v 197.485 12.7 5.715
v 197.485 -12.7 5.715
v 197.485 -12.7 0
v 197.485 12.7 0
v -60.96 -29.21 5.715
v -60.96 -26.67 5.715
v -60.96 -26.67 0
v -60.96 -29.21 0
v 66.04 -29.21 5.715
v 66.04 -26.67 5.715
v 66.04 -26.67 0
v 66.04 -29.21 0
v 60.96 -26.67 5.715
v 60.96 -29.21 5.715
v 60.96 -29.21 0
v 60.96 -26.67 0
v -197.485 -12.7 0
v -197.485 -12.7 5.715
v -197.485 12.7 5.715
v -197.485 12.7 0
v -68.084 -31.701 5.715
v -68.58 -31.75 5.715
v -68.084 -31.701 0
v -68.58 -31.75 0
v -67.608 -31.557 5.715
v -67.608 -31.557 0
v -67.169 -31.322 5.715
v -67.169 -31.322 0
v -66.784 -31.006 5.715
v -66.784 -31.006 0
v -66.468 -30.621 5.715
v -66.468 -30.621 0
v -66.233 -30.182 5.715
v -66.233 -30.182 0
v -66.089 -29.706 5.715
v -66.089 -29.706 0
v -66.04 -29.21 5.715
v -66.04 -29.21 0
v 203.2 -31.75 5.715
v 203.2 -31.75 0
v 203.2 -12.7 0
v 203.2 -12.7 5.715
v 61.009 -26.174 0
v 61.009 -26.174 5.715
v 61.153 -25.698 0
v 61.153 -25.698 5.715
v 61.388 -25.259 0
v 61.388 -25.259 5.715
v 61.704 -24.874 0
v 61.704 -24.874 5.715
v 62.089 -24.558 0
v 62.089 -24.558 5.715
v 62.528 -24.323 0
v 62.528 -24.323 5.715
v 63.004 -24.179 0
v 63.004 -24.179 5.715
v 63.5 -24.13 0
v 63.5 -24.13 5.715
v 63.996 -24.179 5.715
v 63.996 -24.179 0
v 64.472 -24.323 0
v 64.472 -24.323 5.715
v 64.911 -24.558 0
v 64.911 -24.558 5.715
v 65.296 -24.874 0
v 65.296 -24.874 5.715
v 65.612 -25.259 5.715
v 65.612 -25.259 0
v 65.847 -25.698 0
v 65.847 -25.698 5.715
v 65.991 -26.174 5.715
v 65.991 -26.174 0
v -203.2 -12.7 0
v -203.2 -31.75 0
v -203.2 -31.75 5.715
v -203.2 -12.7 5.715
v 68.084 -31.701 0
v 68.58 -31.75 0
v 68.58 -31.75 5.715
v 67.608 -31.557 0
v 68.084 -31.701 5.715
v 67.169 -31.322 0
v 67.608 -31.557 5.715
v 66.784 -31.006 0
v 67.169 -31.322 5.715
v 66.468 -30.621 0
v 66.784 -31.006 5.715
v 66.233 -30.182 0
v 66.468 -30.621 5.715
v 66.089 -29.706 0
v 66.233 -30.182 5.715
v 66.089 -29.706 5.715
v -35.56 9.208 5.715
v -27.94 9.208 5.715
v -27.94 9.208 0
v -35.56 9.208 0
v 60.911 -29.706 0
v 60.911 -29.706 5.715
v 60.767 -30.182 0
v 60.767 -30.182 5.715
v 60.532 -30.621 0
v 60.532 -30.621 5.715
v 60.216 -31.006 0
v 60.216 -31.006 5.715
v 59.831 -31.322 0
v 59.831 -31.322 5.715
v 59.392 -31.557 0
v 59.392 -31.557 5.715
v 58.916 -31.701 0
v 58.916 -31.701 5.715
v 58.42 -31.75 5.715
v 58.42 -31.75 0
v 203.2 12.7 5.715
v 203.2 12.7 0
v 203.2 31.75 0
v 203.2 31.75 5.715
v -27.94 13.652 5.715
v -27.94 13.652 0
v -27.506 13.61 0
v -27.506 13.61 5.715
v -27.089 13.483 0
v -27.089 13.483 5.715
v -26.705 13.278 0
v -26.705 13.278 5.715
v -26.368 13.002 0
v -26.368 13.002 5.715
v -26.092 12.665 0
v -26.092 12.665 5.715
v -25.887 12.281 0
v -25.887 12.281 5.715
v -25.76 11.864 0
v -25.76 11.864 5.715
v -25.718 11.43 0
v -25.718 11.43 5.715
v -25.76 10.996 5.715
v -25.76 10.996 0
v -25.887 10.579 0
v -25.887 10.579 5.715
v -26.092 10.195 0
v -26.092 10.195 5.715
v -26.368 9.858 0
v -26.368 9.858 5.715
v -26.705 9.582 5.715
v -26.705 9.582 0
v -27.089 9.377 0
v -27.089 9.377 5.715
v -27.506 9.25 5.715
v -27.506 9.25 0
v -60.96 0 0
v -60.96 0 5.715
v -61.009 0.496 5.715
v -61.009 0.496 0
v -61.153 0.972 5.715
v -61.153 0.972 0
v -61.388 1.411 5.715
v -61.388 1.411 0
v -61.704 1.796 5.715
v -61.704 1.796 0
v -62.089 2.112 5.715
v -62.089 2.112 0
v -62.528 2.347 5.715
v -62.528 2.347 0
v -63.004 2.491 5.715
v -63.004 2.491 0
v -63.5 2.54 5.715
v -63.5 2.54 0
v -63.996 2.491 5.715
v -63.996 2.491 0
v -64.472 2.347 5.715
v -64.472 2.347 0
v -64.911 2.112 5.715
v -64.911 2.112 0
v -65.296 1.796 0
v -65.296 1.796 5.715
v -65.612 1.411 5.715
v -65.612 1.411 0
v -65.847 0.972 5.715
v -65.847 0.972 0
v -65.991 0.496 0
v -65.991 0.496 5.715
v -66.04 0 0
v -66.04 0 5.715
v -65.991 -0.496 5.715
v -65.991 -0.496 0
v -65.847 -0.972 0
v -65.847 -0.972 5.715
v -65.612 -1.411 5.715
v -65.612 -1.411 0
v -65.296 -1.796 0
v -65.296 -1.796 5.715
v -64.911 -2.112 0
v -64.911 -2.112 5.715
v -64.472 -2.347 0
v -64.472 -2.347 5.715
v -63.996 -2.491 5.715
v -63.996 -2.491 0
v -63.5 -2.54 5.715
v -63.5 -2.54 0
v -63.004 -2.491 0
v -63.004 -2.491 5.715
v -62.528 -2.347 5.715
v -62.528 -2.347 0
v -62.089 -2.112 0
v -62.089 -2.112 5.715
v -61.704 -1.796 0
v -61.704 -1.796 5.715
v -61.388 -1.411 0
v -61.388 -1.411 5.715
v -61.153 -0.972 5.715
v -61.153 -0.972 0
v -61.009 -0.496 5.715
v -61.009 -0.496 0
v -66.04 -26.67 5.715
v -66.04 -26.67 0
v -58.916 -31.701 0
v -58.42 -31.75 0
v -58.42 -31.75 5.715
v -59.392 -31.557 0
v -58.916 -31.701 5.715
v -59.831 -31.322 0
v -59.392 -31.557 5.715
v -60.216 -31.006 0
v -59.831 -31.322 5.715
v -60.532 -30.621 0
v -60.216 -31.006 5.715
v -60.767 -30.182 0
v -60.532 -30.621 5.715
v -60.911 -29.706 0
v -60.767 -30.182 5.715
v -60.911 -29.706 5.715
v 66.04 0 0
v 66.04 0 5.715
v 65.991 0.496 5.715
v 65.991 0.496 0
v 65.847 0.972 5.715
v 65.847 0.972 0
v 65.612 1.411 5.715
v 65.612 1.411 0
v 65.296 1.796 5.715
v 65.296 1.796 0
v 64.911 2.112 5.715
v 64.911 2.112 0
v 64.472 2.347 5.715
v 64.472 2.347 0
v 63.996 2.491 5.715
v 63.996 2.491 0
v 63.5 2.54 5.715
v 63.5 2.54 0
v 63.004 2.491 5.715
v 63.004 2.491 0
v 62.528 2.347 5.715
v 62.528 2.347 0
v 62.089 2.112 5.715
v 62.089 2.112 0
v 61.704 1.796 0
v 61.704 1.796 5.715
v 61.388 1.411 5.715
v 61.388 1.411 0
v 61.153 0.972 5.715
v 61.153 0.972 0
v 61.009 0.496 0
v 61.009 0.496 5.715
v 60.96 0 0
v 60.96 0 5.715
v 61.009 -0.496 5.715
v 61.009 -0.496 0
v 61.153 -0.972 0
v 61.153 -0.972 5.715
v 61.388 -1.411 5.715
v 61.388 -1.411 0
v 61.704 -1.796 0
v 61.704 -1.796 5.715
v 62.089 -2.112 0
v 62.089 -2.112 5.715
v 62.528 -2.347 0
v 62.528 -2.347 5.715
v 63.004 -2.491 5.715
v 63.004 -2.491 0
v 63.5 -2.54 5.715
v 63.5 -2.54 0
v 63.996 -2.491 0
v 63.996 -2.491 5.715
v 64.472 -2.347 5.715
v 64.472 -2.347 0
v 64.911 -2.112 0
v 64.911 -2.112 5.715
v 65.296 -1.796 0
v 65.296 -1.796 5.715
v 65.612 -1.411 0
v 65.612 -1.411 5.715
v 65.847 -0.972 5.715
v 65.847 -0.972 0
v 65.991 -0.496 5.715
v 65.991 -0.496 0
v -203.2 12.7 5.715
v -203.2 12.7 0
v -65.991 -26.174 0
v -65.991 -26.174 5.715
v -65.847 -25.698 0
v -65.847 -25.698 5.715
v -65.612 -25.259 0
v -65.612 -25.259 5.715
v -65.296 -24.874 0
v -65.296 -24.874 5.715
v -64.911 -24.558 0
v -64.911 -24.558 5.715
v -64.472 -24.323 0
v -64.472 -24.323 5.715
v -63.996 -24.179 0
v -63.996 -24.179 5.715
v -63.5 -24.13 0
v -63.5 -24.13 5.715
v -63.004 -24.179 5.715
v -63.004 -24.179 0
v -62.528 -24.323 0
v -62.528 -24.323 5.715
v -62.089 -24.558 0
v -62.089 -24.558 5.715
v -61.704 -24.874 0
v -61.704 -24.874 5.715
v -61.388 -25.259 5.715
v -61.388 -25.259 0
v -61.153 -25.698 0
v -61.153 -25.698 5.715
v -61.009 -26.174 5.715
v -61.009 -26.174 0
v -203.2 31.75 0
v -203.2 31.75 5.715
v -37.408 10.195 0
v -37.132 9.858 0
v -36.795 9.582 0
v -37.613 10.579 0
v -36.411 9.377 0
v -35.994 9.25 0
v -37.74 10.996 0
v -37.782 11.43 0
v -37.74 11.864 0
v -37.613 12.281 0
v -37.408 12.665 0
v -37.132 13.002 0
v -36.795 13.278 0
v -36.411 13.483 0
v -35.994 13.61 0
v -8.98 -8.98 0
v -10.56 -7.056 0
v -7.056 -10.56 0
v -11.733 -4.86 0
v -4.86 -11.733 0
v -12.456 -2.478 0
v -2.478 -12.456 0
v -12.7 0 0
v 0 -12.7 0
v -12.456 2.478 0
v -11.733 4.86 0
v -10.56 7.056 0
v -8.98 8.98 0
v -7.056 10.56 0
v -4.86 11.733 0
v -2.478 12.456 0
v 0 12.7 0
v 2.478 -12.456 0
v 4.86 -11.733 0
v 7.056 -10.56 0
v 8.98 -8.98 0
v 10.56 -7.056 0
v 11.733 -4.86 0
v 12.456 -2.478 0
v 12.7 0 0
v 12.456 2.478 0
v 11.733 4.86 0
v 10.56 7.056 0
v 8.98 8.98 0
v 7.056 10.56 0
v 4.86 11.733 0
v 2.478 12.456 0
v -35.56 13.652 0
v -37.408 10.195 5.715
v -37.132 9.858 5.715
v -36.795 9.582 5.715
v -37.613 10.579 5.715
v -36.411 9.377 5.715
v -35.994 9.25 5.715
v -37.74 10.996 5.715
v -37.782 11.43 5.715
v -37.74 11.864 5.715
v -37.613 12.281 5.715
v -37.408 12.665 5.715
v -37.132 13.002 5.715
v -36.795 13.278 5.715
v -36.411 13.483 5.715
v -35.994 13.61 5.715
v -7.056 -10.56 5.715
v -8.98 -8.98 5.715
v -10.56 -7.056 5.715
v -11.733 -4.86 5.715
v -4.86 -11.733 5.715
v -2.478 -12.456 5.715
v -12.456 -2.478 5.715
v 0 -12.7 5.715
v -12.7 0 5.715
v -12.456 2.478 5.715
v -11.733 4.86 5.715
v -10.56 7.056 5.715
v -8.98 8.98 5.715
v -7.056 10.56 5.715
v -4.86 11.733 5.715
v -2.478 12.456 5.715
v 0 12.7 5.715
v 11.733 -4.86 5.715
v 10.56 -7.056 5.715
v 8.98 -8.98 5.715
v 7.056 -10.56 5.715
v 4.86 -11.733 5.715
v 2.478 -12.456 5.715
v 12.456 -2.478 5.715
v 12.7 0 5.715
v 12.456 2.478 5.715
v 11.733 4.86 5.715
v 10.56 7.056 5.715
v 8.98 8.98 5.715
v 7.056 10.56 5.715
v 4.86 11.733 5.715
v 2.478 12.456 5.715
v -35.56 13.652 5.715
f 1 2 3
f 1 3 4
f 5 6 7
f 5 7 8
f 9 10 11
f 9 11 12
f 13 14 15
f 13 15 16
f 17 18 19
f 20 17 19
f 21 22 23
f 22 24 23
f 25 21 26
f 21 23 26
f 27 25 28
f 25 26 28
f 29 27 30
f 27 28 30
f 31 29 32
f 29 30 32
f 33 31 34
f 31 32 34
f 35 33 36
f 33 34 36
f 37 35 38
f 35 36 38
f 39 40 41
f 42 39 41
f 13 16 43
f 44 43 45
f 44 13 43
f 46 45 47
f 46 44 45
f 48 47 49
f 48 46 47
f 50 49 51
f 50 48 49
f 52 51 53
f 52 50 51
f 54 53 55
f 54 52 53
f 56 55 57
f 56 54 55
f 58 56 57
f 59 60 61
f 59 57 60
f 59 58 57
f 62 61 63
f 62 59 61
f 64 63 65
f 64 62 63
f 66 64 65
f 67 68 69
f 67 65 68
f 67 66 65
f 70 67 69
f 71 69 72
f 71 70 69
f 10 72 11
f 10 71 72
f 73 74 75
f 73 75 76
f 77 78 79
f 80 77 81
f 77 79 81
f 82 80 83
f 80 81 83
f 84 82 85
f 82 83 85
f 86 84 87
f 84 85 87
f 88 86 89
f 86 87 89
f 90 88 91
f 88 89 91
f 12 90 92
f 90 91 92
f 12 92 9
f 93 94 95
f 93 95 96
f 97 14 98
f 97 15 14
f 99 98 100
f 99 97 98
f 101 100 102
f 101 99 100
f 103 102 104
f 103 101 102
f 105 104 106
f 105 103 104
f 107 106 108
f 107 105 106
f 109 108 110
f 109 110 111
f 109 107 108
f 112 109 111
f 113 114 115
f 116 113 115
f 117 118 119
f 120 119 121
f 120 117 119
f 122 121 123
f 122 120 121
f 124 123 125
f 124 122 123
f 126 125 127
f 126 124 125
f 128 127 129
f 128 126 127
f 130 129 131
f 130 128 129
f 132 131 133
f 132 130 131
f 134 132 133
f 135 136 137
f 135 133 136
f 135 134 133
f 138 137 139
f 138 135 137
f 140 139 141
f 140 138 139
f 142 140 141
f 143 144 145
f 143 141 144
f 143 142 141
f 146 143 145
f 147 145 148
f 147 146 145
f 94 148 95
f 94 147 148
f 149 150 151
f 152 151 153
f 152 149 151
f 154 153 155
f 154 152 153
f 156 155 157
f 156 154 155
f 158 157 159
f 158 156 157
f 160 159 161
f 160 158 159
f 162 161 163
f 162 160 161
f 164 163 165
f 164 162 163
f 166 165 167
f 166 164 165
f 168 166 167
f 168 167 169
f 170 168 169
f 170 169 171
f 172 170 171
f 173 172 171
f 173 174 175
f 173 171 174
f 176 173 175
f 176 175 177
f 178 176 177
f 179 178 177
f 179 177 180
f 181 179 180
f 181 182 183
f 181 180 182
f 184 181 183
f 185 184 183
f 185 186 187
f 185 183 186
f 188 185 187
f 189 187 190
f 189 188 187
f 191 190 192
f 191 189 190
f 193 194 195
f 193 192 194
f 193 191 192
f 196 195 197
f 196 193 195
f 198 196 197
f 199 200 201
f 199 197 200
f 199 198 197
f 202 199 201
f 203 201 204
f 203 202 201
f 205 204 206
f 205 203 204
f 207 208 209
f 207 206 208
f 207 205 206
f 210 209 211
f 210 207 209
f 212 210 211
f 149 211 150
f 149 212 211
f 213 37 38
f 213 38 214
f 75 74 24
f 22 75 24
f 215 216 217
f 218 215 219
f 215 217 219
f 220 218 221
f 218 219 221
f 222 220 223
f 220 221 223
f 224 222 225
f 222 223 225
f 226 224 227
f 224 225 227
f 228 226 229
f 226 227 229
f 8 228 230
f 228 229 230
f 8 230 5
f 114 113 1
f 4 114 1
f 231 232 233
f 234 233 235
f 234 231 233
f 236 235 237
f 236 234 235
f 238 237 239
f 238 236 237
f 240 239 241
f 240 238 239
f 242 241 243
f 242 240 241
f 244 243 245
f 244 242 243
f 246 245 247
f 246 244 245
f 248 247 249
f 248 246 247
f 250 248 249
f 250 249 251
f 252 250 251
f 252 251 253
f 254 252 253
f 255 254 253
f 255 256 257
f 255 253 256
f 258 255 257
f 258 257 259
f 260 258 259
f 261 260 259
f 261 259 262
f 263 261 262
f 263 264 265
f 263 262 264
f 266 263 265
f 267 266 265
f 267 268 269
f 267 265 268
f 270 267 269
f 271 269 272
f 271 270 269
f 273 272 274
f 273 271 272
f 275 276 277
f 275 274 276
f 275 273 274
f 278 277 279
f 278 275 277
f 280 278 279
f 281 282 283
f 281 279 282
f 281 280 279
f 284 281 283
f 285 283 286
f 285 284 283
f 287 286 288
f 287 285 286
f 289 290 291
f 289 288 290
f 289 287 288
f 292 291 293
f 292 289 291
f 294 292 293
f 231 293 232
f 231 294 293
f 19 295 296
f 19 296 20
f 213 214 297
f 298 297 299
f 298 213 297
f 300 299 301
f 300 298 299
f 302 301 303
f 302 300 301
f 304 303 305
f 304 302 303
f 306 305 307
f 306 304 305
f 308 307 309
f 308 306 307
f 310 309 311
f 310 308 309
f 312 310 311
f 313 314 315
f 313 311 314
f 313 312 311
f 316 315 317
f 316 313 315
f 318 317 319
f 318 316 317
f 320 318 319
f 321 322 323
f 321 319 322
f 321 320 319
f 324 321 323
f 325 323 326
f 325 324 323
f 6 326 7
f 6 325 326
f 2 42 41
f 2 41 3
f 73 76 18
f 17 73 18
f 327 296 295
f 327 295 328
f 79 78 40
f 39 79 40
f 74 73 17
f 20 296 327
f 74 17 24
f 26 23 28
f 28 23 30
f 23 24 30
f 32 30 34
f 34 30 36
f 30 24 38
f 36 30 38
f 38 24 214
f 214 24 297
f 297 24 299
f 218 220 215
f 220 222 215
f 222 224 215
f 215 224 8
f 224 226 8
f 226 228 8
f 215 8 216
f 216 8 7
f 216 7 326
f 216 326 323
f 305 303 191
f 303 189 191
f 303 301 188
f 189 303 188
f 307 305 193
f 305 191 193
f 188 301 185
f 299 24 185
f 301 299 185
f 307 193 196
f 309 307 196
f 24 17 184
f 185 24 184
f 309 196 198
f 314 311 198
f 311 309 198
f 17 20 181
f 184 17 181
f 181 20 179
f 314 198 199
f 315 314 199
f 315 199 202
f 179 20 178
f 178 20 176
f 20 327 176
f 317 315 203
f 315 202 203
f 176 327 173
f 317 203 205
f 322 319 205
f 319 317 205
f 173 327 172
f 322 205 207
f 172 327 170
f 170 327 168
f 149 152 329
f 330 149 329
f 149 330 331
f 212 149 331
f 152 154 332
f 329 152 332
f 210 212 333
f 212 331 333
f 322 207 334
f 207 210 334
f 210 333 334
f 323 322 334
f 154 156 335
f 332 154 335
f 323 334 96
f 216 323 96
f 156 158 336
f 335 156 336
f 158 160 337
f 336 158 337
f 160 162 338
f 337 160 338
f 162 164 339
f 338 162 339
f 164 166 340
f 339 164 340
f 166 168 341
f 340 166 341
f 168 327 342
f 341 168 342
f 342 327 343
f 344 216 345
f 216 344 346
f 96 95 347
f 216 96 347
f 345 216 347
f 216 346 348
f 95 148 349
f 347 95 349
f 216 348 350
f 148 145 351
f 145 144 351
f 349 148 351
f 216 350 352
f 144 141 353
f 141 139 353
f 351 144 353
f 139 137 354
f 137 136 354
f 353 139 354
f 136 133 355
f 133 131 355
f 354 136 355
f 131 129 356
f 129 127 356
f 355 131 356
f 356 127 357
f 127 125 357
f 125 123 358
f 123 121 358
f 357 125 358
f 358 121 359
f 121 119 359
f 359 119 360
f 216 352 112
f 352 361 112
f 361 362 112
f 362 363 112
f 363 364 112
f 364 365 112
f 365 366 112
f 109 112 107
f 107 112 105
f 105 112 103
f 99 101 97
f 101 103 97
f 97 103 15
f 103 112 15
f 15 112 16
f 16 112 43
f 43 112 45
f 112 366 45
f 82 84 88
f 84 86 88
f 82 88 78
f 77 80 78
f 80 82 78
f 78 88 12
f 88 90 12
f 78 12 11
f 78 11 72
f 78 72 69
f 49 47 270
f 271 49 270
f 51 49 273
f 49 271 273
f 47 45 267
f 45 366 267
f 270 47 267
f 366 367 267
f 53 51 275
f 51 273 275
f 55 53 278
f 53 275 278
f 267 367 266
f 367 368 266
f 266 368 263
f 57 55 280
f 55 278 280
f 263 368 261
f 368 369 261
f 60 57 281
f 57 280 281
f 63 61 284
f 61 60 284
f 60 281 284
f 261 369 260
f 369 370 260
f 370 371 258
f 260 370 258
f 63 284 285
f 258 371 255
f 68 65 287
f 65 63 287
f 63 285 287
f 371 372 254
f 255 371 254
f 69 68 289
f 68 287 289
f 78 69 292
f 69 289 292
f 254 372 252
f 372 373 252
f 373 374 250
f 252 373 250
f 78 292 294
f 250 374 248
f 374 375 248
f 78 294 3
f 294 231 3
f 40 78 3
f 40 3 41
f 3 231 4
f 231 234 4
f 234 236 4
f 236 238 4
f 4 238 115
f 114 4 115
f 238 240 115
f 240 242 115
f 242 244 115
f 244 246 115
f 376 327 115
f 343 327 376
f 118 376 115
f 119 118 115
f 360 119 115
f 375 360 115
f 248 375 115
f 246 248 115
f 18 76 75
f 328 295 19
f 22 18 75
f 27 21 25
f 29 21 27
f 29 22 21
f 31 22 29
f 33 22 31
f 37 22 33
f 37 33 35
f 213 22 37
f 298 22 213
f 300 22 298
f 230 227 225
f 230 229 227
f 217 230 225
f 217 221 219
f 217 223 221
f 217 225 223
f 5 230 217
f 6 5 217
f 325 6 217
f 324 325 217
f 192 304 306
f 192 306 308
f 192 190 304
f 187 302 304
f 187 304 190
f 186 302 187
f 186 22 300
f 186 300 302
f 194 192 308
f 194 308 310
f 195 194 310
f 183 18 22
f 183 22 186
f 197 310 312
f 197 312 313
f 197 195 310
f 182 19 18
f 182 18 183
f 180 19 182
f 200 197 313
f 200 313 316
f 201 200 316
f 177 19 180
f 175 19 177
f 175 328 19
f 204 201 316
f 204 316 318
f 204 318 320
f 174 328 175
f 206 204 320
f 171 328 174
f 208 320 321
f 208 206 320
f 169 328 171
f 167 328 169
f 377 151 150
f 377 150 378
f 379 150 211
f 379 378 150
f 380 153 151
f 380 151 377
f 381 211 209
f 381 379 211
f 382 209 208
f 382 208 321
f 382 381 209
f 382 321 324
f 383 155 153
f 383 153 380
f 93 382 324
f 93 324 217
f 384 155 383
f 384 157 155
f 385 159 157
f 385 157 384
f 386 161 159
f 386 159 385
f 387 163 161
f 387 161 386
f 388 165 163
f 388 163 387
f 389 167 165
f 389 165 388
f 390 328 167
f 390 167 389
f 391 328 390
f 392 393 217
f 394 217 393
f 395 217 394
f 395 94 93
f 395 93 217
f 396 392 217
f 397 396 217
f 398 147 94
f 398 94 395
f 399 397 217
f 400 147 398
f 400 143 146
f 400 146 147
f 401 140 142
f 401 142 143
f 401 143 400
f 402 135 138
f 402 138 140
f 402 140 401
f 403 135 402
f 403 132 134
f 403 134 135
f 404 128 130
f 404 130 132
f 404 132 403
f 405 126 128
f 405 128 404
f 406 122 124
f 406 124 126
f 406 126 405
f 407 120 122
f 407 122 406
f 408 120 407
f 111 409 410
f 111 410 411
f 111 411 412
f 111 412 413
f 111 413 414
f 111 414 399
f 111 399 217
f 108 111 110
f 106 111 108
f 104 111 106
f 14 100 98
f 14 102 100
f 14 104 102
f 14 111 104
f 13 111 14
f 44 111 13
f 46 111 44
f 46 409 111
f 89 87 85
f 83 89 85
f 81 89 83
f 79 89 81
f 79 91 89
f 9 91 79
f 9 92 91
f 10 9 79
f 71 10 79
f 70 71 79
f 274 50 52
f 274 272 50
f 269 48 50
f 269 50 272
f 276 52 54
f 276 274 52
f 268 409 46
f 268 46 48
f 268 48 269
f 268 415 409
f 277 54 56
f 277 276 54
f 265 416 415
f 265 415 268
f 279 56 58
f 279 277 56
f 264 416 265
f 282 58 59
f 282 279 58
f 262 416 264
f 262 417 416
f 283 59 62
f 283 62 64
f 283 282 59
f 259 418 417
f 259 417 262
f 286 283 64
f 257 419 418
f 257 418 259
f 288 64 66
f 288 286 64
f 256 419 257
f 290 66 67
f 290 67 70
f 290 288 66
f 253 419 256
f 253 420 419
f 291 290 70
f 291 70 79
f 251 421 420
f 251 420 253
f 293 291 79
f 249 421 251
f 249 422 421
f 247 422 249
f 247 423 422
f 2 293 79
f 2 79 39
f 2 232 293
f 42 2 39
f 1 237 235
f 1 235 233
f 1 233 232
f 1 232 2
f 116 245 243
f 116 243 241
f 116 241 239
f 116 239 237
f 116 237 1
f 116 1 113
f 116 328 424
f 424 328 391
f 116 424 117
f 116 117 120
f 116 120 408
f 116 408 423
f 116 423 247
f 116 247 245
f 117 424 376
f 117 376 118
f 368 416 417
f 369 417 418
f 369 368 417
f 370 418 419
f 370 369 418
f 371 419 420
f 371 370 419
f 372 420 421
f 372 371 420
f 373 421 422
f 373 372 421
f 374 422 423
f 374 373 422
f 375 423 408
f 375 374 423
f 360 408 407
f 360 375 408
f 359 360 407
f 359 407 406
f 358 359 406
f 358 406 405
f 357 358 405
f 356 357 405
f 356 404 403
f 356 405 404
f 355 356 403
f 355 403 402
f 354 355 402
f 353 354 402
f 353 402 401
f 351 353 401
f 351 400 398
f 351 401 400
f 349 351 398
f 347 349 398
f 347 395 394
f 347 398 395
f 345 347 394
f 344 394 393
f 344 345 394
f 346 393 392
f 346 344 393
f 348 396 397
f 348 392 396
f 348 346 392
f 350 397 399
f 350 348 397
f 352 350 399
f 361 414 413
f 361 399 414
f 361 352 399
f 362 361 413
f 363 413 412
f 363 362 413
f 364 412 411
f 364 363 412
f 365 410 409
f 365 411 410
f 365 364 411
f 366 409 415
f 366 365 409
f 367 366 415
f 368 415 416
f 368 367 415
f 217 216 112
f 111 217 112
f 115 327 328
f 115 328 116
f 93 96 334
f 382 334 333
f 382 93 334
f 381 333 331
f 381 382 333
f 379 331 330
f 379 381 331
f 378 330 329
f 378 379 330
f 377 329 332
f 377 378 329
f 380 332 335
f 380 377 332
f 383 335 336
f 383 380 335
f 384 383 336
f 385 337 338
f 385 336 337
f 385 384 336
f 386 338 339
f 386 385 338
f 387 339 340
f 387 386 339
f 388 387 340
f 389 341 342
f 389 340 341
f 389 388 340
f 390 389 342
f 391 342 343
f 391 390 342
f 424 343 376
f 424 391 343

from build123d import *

# Parameters (mm, degrees)
SKETCH1_W                        = 406.4
SKETCH1_H                        = 63.5
BOSS_EXTRUDE1_DEPTH              = 5.715
SKETCH2_R                        = 12.7
SEED_HOLE_DEPTH                  = 6.715
SEED_HOLE_DEPTH_BACK             = 1
SKETCH3_R                        = 2.54
LED_MOUNT_DEPTH                  = 6.715
IR_SENSOR_WIRE_KEEPER_DEPTH      = 1
IR_SENSOR_WIRE_KEEPER_DEPTH_BACK = 6.715
FILLET1_R                        = 2.54
SEED_SWITCH_MOUNT_DEPTH          = 6.715
SKETCH6_W                        = 5.715
SKETCH6_H                        = 25.4
CUT_EXTRUDE6_DEPTH               = 6.715


with BuildPart() as part:
    # Sketch1 → Boss-Extrude1 (new body)
    with BuildSketch(Plane.XY):
        Rectangle(SKETCH1_W, SKETCH1_H)
    extrude(amount=BOSS_EXTRUDE1_DEPTH)

    # Sketch2 → Seed Hole (cut, two sides)
    with BuildSketch(Plane.XY) as seed_hole_sk:
        Circle(SKETCH2_R)
    extrude(amount=SEED_HOLE_DEPTH, mode=Mode.SUBTRACT)
    extrude(seed_hole_sk.sketch, amount=-SEED_HOLE_DEPTH_BACK, mode=Mode.SUBTRACT)

    # Sketch3 → LED Mount (cut, through all)
    with BuildSketch(Plane.XY):
        with Locations((-63.5, 0)):
            Circle(SKETCH3_R)
        with Locations((63.5, 0)):
            Circle(SKETCH3_R)
    extrude(amount=LED_MOUNT_DEPTH, mode=Mode.SUBTRACT)

    # Sketch4 → IR Sensor Wire Keeper (cut, two sides)
    with BuildSketch(Plane.XY.offset(5.715)) as ir_sensor_wire_keeper_sk:
        with BuildLine():
            Line((-60.96, -26.67), (-60.96, -36.83))
            ThreePointArc((-60.96, -36.83), (-63.5, -39.37), (-66.04, -36.83))
            Line((-66.04, -36.83), (-66.04, -26.67))
            ThreePointArc((-66.04, -26.67), (-63.5, -24.13), (-60.96, -26.67))
        make_face()
        with BuildLine():
            Line((66.04, -26.67), (66.04, -36.83))
            ThreePointArc((66.04, -36.83), (63.5, -39.37), (60.96, -36.83))
            Line((60.96, -36.83), (60.96, -26.67))
            ThreePointArc((60.96, -26.67), (63.5, -24.13), (66.04, -26.67))
        make_face()
    extrude(amount=IR_SENSOR_WIRE_KEEPER_DEPTH, mode=Mode.SUBTRACT)
    extrude(ir_sensor_wire_keeper_sk.sketch, amount=-IR_SENSOR_WIRE_KEEPER_DEPTH_BACK, mode=Mode.SUBTRACT)

    # Fillet1
    fillet1_edges = [part.edges().sort_by_distance(p)[0] for p in [
        (-60.96, -31.75, 2.8575),
        (-66.04, -31.75, 2.8575),
        (66.04, -31.75, 2.8575),
        (60.96, -31.75, 2.8575),
    ]]
    fillet(fillet1_edges, radius=FILLET1_R)

    # Sketch5 → Seed Switch Mount (cut, through all)
    with BuildSketch(Plane.XY.offset(5.715)):
        with BuildLine():
            Line((-35.56, 13.6525), (-27.94, 13.6525))
            ThreePointArc((-27.94, 13.6525), (-25.7175, 11.43), (-27.94, 9.2075))
            Line((-27.94, 9.2075), (-35.56, 9.2075))
            ThreePointArc((-35.56, 9.2075), (-37.7825, 11.43), (-35.56, 13.6525))
        make_face()
    extrude(amount=-SEED_SWITCH_MOUNT_DEPTH, mode=Mode.SUBTRACT)

    # Sketch6 → Cut-Extrude6 (cut, through all)
    with BuildSketch(Plane.XY.offset(5.715)):
        with Locations((-200.3425, 0)):
            Rectangle(SKETCH6_W, SKETCH6_H)
    cut_extrude6 = extrude(amount=-CUT_EXTRUDE6_DEPTH, mode=Mode.SUBTRACT)

    # Mirror1: Cut-Extrude6 across plane
    add(cut_extrude6.mirror(Plane(origin=(0, 0, 0), x_dir=(0, 0, 1), z_dir=(1, 0, 0))), mode=Mode.SUBTRACT)


solid = part.part
